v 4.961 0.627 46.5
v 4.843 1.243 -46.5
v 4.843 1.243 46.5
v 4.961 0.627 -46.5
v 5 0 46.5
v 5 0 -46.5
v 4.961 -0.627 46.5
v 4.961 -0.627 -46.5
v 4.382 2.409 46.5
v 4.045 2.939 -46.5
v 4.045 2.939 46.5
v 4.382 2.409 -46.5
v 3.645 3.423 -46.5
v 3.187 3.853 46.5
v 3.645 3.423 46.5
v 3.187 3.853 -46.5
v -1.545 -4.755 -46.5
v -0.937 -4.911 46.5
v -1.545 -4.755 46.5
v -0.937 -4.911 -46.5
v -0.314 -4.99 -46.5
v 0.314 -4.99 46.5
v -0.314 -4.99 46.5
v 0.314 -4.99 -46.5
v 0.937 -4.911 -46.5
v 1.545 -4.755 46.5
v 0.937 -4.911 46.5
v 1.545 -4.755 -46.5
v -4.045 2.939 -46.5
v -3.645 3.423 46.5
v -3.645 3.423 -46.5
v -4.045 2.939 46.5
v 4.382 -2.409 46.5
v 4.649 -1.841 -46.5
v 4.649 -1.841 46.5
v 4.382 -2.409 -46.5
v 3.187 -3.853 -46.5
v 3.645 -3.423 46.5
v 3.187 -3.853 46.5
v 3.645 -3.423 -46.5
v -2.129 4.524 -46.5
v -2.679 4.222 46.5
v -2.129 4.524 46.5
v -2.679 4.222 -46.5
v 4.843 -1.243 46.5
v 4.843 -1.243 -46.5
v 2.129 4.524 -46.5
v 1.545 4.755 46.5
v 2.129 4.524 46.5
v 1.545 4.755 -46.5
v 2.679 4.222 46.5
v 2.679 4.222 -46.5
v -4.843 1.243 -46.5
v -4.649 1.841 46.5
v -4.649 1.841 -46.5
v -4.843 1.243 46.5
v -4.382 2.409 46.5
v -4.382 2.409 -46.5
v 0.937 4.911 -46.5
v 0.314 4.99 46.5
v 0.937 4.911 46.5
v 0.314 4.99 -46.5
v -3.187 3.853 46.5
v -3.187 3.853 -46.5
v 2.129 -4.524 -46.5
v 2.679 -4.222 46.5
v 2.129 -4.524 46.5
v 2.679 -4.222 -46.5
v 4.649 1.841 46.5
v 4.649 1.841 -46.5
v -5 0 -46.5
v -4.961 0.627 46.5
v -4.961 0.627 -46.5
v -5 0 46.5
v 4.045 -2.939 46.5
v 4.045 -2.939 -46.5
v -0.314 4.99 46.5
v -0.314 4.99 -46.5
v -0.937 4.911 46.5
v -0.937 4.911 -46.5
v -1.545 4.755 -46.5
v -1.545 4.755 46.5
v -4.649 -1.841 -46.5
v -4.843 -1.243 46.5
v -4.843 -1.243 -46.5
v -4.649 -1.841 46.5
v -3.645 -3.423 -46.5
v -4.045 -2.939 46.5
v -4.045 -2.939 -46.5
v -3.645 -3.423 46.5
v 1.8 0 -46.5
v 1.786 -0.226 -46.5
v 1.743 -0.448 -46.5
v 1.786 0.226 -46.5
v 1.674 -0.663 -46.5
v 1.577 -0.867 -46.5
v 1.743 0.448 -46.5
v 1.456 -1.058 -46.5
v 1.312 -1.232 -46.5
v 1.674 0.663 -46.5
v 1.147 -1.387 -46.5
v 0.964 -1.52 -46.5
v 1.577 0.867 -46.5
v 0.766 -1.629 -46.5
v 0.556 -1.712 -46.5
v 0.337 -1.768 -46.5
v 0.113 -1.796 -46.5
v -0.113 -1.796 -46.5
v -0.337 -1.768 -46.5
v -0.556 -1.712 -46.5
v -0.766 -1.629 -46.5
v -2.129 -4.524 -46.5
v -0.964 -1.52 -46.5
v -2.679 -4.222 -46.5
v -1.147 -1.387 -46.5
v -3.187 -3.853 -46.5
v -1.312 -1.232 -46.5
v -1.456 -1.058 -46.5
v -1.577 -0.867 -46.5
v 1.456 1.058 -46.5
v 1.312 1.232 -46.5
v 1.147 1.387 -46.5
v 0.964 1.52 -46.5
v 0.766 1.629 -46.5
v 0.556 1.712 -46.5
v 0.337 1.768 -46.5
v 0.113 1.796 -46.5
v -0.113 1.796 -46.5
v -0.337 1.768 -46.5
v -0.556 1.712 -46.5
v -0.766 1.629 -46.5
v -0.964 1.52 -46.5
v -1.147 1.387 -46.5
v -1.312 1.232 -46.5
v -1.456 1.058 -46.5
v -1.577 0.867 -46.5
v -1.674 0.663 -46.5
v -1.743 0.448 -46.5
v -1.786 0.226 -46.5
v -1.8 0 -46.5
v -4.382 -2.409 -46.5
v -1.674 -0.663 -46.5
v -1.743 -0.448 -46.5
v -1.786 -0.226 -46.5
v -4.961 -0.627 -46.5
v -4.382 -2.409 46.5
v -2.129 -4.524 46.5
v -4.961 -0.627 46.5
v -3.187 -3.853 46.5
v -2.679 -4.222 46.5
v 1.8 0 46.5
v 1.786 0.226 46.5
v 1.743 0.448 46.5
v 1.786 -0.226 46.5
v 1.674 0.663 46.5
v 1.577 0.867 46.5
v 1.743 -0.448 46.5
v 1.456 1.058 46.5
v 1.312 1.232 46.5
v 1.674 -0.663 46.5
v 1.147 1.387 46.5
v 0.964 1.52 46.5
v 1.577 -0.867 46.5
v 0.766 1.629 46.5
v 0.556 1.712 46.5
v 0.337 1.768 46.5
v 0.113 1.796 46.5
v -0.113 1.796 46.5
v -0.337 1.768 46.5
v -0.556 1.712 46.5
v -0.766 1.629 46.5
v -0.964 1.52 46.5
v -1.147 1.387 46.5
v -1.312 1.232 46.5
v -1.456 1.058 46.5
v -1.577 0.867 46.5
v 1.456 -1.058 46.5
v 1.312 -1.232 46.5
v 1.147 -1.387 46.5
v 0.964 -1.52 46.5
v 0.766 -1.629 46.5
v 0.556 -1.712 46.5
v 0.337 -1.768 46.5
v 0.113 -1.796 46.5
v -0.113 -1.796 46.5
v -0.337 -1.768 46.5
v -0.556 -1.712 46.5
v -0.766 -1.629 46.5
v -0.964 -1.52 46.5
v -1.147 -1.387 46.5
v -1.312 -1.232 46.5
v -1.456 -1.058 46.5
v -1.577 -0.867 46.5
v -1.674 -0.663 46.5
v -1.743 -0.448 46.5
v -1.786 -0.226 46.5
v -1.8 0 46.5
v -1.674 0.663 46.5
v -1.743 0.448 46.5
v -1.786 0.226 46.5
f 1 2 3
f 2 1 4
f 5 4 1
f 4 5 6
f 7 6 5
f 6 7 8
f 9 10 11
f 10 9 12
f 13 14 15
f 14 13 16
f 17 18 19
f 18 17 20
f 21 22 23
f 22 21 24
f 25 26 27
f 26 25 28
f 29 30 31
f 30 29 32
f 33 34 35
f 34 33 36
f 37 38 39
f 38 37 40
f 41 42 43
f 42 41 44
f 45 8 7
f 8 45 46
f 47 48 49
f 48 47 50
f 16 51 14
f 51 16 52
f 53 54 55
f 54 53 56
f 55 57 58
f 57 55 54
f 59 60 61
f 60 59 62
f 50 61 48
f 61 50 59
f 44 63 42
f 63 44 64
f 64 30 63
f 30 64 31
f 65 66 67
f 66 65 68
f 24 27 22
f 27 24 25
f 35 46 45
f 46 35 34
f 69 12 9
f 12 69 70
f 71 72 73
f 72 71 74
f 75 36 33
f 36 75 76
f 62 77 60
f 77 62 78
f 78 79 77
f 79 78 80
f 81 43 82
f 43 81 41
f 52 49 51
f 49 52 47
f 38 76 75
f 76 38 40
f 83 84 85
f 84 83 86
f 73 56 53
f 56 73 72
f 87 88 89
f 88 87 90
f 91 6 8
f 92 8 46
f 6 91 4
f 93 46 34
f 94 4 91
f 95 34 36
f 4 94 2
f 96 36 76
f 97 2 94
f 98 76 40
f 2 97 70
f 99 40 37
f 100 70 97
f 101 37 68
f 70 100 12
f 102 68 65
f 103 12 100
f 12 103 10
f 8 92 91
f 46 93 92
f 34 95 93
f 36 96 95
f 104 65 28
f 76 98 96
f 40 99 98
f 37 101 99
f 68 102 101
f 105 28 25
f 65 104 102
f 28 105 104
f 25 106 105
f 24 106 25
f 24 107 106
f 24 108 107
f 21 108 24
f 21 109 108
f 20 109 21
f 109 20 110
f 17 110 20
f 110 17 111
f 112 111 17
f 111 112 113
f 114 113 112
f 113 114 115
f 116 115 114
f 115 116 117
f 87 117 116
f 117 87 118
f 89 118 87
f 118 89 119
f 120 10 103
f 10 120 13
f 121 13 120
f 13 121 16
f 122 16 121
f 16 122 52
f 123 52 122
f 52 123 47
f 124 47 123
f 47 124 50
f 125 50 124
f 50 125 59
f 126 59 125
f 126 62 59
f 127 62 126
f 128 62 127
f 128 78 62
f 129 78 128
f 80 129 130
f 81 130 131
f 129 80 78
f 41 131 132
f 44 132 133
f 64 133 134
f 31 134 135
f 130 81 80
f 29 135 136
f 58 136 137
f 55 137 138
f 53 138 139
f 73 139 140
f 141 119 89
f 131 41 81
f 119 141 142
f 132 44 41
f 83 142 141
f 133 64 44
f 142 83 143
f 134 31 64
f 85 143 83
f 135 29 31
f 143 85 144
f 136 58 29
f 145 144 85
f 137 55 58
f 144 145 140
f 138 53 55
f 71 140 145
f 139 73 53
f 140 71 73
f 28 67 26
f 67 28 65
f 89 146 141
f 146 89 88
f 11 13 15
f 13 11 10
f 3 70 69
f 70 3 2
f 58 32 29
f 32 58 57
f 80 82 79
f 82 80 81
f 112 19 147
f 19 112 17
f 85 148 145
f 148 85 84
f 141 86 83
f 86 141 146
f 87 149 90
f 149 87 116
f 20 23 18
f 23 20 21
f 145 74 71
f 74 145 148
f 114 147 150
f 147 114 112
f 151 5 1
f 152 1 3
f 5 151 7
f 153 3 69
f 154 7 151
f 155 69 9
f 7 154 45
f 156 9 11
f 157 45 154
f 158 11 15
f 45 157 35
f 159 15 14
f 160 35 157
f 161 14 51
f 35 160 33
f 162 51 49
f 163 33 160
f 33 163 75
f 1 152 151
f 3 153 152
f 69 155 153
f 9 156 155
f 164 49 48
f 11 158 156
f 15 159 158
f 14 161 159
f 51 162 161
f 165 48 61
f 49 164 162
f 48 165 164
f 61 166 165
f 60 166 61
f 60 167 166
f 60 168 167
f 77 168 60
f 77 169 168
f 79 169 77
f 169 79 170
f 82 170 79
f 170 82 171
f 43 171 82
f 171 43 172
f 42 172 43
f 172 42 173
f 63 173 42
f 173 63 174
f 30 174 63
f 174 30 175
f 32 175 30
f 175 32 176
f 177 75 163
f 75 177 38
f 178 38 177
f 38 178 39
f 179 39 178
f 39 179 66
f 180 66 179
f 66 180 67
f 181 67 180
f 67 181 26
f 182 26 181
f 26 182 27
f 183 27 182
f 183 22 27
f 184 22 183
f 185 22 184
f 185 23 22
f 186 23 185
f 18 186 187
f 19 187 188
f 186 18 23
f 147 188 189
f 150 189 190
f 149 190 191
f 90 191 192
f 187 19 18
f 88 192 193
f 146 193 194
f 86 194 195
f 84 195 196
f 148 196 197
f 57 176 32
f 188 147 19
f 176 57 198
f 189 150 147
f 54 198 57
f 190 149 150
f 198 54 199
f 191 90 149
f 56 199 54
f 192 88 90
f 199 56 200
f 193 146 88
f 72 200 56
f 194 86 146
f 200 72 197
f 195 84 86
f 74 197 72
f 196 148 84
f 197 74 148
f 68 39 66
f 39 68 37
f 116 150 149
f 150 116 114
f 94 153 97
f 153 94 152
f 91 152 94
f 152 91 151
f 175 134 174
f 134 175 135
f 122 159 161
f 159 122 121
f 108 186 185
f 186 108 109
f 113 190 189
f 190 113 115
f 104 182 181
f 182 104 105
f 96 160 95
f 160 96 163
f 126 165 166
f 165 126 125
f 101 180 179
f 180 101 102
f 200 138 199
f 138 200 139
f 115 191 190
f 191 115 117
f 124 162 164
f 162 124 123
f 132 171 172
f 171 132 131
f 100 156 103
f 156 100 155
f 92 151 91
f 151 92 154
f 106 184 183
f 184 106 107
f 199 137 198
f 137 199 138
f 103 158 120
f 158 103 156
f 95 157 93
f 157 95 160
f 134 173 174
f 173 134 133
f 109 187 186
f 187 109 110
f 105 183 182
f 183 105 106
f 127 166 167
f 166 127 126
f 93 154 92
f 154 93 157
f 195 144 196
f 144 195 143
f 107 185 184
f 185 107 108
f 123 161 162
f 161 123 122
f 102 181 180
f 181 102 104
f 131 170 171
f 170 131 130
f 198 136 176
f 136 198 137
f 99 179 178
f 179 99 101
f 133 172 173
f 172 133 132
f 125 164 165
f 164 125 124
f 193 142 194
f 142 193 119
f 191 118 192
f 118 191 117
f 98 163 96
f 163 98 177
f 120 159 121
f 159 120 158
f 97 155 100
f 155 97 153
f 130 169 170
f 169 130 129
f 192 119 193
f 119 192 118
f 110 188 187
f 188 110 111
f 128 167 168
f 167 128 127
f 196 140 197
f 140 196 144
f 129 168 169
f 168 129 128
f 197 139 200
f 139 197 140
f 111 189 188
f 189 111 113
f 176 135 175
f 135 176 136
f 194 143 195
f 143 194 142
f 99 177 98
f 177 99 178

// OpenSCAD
$fn = 50;


difference() {
	union() {
		translate(v = [0, 0, -46.5000000000]) {
			cylinder(h = 93, r = 5.0000000000);
		}
	}
	union() {
		#translate(v = [0, 0, -100.0000000000]) {
			cylinder(h = 200, r = 1.8000000000);
		}
	}
}
